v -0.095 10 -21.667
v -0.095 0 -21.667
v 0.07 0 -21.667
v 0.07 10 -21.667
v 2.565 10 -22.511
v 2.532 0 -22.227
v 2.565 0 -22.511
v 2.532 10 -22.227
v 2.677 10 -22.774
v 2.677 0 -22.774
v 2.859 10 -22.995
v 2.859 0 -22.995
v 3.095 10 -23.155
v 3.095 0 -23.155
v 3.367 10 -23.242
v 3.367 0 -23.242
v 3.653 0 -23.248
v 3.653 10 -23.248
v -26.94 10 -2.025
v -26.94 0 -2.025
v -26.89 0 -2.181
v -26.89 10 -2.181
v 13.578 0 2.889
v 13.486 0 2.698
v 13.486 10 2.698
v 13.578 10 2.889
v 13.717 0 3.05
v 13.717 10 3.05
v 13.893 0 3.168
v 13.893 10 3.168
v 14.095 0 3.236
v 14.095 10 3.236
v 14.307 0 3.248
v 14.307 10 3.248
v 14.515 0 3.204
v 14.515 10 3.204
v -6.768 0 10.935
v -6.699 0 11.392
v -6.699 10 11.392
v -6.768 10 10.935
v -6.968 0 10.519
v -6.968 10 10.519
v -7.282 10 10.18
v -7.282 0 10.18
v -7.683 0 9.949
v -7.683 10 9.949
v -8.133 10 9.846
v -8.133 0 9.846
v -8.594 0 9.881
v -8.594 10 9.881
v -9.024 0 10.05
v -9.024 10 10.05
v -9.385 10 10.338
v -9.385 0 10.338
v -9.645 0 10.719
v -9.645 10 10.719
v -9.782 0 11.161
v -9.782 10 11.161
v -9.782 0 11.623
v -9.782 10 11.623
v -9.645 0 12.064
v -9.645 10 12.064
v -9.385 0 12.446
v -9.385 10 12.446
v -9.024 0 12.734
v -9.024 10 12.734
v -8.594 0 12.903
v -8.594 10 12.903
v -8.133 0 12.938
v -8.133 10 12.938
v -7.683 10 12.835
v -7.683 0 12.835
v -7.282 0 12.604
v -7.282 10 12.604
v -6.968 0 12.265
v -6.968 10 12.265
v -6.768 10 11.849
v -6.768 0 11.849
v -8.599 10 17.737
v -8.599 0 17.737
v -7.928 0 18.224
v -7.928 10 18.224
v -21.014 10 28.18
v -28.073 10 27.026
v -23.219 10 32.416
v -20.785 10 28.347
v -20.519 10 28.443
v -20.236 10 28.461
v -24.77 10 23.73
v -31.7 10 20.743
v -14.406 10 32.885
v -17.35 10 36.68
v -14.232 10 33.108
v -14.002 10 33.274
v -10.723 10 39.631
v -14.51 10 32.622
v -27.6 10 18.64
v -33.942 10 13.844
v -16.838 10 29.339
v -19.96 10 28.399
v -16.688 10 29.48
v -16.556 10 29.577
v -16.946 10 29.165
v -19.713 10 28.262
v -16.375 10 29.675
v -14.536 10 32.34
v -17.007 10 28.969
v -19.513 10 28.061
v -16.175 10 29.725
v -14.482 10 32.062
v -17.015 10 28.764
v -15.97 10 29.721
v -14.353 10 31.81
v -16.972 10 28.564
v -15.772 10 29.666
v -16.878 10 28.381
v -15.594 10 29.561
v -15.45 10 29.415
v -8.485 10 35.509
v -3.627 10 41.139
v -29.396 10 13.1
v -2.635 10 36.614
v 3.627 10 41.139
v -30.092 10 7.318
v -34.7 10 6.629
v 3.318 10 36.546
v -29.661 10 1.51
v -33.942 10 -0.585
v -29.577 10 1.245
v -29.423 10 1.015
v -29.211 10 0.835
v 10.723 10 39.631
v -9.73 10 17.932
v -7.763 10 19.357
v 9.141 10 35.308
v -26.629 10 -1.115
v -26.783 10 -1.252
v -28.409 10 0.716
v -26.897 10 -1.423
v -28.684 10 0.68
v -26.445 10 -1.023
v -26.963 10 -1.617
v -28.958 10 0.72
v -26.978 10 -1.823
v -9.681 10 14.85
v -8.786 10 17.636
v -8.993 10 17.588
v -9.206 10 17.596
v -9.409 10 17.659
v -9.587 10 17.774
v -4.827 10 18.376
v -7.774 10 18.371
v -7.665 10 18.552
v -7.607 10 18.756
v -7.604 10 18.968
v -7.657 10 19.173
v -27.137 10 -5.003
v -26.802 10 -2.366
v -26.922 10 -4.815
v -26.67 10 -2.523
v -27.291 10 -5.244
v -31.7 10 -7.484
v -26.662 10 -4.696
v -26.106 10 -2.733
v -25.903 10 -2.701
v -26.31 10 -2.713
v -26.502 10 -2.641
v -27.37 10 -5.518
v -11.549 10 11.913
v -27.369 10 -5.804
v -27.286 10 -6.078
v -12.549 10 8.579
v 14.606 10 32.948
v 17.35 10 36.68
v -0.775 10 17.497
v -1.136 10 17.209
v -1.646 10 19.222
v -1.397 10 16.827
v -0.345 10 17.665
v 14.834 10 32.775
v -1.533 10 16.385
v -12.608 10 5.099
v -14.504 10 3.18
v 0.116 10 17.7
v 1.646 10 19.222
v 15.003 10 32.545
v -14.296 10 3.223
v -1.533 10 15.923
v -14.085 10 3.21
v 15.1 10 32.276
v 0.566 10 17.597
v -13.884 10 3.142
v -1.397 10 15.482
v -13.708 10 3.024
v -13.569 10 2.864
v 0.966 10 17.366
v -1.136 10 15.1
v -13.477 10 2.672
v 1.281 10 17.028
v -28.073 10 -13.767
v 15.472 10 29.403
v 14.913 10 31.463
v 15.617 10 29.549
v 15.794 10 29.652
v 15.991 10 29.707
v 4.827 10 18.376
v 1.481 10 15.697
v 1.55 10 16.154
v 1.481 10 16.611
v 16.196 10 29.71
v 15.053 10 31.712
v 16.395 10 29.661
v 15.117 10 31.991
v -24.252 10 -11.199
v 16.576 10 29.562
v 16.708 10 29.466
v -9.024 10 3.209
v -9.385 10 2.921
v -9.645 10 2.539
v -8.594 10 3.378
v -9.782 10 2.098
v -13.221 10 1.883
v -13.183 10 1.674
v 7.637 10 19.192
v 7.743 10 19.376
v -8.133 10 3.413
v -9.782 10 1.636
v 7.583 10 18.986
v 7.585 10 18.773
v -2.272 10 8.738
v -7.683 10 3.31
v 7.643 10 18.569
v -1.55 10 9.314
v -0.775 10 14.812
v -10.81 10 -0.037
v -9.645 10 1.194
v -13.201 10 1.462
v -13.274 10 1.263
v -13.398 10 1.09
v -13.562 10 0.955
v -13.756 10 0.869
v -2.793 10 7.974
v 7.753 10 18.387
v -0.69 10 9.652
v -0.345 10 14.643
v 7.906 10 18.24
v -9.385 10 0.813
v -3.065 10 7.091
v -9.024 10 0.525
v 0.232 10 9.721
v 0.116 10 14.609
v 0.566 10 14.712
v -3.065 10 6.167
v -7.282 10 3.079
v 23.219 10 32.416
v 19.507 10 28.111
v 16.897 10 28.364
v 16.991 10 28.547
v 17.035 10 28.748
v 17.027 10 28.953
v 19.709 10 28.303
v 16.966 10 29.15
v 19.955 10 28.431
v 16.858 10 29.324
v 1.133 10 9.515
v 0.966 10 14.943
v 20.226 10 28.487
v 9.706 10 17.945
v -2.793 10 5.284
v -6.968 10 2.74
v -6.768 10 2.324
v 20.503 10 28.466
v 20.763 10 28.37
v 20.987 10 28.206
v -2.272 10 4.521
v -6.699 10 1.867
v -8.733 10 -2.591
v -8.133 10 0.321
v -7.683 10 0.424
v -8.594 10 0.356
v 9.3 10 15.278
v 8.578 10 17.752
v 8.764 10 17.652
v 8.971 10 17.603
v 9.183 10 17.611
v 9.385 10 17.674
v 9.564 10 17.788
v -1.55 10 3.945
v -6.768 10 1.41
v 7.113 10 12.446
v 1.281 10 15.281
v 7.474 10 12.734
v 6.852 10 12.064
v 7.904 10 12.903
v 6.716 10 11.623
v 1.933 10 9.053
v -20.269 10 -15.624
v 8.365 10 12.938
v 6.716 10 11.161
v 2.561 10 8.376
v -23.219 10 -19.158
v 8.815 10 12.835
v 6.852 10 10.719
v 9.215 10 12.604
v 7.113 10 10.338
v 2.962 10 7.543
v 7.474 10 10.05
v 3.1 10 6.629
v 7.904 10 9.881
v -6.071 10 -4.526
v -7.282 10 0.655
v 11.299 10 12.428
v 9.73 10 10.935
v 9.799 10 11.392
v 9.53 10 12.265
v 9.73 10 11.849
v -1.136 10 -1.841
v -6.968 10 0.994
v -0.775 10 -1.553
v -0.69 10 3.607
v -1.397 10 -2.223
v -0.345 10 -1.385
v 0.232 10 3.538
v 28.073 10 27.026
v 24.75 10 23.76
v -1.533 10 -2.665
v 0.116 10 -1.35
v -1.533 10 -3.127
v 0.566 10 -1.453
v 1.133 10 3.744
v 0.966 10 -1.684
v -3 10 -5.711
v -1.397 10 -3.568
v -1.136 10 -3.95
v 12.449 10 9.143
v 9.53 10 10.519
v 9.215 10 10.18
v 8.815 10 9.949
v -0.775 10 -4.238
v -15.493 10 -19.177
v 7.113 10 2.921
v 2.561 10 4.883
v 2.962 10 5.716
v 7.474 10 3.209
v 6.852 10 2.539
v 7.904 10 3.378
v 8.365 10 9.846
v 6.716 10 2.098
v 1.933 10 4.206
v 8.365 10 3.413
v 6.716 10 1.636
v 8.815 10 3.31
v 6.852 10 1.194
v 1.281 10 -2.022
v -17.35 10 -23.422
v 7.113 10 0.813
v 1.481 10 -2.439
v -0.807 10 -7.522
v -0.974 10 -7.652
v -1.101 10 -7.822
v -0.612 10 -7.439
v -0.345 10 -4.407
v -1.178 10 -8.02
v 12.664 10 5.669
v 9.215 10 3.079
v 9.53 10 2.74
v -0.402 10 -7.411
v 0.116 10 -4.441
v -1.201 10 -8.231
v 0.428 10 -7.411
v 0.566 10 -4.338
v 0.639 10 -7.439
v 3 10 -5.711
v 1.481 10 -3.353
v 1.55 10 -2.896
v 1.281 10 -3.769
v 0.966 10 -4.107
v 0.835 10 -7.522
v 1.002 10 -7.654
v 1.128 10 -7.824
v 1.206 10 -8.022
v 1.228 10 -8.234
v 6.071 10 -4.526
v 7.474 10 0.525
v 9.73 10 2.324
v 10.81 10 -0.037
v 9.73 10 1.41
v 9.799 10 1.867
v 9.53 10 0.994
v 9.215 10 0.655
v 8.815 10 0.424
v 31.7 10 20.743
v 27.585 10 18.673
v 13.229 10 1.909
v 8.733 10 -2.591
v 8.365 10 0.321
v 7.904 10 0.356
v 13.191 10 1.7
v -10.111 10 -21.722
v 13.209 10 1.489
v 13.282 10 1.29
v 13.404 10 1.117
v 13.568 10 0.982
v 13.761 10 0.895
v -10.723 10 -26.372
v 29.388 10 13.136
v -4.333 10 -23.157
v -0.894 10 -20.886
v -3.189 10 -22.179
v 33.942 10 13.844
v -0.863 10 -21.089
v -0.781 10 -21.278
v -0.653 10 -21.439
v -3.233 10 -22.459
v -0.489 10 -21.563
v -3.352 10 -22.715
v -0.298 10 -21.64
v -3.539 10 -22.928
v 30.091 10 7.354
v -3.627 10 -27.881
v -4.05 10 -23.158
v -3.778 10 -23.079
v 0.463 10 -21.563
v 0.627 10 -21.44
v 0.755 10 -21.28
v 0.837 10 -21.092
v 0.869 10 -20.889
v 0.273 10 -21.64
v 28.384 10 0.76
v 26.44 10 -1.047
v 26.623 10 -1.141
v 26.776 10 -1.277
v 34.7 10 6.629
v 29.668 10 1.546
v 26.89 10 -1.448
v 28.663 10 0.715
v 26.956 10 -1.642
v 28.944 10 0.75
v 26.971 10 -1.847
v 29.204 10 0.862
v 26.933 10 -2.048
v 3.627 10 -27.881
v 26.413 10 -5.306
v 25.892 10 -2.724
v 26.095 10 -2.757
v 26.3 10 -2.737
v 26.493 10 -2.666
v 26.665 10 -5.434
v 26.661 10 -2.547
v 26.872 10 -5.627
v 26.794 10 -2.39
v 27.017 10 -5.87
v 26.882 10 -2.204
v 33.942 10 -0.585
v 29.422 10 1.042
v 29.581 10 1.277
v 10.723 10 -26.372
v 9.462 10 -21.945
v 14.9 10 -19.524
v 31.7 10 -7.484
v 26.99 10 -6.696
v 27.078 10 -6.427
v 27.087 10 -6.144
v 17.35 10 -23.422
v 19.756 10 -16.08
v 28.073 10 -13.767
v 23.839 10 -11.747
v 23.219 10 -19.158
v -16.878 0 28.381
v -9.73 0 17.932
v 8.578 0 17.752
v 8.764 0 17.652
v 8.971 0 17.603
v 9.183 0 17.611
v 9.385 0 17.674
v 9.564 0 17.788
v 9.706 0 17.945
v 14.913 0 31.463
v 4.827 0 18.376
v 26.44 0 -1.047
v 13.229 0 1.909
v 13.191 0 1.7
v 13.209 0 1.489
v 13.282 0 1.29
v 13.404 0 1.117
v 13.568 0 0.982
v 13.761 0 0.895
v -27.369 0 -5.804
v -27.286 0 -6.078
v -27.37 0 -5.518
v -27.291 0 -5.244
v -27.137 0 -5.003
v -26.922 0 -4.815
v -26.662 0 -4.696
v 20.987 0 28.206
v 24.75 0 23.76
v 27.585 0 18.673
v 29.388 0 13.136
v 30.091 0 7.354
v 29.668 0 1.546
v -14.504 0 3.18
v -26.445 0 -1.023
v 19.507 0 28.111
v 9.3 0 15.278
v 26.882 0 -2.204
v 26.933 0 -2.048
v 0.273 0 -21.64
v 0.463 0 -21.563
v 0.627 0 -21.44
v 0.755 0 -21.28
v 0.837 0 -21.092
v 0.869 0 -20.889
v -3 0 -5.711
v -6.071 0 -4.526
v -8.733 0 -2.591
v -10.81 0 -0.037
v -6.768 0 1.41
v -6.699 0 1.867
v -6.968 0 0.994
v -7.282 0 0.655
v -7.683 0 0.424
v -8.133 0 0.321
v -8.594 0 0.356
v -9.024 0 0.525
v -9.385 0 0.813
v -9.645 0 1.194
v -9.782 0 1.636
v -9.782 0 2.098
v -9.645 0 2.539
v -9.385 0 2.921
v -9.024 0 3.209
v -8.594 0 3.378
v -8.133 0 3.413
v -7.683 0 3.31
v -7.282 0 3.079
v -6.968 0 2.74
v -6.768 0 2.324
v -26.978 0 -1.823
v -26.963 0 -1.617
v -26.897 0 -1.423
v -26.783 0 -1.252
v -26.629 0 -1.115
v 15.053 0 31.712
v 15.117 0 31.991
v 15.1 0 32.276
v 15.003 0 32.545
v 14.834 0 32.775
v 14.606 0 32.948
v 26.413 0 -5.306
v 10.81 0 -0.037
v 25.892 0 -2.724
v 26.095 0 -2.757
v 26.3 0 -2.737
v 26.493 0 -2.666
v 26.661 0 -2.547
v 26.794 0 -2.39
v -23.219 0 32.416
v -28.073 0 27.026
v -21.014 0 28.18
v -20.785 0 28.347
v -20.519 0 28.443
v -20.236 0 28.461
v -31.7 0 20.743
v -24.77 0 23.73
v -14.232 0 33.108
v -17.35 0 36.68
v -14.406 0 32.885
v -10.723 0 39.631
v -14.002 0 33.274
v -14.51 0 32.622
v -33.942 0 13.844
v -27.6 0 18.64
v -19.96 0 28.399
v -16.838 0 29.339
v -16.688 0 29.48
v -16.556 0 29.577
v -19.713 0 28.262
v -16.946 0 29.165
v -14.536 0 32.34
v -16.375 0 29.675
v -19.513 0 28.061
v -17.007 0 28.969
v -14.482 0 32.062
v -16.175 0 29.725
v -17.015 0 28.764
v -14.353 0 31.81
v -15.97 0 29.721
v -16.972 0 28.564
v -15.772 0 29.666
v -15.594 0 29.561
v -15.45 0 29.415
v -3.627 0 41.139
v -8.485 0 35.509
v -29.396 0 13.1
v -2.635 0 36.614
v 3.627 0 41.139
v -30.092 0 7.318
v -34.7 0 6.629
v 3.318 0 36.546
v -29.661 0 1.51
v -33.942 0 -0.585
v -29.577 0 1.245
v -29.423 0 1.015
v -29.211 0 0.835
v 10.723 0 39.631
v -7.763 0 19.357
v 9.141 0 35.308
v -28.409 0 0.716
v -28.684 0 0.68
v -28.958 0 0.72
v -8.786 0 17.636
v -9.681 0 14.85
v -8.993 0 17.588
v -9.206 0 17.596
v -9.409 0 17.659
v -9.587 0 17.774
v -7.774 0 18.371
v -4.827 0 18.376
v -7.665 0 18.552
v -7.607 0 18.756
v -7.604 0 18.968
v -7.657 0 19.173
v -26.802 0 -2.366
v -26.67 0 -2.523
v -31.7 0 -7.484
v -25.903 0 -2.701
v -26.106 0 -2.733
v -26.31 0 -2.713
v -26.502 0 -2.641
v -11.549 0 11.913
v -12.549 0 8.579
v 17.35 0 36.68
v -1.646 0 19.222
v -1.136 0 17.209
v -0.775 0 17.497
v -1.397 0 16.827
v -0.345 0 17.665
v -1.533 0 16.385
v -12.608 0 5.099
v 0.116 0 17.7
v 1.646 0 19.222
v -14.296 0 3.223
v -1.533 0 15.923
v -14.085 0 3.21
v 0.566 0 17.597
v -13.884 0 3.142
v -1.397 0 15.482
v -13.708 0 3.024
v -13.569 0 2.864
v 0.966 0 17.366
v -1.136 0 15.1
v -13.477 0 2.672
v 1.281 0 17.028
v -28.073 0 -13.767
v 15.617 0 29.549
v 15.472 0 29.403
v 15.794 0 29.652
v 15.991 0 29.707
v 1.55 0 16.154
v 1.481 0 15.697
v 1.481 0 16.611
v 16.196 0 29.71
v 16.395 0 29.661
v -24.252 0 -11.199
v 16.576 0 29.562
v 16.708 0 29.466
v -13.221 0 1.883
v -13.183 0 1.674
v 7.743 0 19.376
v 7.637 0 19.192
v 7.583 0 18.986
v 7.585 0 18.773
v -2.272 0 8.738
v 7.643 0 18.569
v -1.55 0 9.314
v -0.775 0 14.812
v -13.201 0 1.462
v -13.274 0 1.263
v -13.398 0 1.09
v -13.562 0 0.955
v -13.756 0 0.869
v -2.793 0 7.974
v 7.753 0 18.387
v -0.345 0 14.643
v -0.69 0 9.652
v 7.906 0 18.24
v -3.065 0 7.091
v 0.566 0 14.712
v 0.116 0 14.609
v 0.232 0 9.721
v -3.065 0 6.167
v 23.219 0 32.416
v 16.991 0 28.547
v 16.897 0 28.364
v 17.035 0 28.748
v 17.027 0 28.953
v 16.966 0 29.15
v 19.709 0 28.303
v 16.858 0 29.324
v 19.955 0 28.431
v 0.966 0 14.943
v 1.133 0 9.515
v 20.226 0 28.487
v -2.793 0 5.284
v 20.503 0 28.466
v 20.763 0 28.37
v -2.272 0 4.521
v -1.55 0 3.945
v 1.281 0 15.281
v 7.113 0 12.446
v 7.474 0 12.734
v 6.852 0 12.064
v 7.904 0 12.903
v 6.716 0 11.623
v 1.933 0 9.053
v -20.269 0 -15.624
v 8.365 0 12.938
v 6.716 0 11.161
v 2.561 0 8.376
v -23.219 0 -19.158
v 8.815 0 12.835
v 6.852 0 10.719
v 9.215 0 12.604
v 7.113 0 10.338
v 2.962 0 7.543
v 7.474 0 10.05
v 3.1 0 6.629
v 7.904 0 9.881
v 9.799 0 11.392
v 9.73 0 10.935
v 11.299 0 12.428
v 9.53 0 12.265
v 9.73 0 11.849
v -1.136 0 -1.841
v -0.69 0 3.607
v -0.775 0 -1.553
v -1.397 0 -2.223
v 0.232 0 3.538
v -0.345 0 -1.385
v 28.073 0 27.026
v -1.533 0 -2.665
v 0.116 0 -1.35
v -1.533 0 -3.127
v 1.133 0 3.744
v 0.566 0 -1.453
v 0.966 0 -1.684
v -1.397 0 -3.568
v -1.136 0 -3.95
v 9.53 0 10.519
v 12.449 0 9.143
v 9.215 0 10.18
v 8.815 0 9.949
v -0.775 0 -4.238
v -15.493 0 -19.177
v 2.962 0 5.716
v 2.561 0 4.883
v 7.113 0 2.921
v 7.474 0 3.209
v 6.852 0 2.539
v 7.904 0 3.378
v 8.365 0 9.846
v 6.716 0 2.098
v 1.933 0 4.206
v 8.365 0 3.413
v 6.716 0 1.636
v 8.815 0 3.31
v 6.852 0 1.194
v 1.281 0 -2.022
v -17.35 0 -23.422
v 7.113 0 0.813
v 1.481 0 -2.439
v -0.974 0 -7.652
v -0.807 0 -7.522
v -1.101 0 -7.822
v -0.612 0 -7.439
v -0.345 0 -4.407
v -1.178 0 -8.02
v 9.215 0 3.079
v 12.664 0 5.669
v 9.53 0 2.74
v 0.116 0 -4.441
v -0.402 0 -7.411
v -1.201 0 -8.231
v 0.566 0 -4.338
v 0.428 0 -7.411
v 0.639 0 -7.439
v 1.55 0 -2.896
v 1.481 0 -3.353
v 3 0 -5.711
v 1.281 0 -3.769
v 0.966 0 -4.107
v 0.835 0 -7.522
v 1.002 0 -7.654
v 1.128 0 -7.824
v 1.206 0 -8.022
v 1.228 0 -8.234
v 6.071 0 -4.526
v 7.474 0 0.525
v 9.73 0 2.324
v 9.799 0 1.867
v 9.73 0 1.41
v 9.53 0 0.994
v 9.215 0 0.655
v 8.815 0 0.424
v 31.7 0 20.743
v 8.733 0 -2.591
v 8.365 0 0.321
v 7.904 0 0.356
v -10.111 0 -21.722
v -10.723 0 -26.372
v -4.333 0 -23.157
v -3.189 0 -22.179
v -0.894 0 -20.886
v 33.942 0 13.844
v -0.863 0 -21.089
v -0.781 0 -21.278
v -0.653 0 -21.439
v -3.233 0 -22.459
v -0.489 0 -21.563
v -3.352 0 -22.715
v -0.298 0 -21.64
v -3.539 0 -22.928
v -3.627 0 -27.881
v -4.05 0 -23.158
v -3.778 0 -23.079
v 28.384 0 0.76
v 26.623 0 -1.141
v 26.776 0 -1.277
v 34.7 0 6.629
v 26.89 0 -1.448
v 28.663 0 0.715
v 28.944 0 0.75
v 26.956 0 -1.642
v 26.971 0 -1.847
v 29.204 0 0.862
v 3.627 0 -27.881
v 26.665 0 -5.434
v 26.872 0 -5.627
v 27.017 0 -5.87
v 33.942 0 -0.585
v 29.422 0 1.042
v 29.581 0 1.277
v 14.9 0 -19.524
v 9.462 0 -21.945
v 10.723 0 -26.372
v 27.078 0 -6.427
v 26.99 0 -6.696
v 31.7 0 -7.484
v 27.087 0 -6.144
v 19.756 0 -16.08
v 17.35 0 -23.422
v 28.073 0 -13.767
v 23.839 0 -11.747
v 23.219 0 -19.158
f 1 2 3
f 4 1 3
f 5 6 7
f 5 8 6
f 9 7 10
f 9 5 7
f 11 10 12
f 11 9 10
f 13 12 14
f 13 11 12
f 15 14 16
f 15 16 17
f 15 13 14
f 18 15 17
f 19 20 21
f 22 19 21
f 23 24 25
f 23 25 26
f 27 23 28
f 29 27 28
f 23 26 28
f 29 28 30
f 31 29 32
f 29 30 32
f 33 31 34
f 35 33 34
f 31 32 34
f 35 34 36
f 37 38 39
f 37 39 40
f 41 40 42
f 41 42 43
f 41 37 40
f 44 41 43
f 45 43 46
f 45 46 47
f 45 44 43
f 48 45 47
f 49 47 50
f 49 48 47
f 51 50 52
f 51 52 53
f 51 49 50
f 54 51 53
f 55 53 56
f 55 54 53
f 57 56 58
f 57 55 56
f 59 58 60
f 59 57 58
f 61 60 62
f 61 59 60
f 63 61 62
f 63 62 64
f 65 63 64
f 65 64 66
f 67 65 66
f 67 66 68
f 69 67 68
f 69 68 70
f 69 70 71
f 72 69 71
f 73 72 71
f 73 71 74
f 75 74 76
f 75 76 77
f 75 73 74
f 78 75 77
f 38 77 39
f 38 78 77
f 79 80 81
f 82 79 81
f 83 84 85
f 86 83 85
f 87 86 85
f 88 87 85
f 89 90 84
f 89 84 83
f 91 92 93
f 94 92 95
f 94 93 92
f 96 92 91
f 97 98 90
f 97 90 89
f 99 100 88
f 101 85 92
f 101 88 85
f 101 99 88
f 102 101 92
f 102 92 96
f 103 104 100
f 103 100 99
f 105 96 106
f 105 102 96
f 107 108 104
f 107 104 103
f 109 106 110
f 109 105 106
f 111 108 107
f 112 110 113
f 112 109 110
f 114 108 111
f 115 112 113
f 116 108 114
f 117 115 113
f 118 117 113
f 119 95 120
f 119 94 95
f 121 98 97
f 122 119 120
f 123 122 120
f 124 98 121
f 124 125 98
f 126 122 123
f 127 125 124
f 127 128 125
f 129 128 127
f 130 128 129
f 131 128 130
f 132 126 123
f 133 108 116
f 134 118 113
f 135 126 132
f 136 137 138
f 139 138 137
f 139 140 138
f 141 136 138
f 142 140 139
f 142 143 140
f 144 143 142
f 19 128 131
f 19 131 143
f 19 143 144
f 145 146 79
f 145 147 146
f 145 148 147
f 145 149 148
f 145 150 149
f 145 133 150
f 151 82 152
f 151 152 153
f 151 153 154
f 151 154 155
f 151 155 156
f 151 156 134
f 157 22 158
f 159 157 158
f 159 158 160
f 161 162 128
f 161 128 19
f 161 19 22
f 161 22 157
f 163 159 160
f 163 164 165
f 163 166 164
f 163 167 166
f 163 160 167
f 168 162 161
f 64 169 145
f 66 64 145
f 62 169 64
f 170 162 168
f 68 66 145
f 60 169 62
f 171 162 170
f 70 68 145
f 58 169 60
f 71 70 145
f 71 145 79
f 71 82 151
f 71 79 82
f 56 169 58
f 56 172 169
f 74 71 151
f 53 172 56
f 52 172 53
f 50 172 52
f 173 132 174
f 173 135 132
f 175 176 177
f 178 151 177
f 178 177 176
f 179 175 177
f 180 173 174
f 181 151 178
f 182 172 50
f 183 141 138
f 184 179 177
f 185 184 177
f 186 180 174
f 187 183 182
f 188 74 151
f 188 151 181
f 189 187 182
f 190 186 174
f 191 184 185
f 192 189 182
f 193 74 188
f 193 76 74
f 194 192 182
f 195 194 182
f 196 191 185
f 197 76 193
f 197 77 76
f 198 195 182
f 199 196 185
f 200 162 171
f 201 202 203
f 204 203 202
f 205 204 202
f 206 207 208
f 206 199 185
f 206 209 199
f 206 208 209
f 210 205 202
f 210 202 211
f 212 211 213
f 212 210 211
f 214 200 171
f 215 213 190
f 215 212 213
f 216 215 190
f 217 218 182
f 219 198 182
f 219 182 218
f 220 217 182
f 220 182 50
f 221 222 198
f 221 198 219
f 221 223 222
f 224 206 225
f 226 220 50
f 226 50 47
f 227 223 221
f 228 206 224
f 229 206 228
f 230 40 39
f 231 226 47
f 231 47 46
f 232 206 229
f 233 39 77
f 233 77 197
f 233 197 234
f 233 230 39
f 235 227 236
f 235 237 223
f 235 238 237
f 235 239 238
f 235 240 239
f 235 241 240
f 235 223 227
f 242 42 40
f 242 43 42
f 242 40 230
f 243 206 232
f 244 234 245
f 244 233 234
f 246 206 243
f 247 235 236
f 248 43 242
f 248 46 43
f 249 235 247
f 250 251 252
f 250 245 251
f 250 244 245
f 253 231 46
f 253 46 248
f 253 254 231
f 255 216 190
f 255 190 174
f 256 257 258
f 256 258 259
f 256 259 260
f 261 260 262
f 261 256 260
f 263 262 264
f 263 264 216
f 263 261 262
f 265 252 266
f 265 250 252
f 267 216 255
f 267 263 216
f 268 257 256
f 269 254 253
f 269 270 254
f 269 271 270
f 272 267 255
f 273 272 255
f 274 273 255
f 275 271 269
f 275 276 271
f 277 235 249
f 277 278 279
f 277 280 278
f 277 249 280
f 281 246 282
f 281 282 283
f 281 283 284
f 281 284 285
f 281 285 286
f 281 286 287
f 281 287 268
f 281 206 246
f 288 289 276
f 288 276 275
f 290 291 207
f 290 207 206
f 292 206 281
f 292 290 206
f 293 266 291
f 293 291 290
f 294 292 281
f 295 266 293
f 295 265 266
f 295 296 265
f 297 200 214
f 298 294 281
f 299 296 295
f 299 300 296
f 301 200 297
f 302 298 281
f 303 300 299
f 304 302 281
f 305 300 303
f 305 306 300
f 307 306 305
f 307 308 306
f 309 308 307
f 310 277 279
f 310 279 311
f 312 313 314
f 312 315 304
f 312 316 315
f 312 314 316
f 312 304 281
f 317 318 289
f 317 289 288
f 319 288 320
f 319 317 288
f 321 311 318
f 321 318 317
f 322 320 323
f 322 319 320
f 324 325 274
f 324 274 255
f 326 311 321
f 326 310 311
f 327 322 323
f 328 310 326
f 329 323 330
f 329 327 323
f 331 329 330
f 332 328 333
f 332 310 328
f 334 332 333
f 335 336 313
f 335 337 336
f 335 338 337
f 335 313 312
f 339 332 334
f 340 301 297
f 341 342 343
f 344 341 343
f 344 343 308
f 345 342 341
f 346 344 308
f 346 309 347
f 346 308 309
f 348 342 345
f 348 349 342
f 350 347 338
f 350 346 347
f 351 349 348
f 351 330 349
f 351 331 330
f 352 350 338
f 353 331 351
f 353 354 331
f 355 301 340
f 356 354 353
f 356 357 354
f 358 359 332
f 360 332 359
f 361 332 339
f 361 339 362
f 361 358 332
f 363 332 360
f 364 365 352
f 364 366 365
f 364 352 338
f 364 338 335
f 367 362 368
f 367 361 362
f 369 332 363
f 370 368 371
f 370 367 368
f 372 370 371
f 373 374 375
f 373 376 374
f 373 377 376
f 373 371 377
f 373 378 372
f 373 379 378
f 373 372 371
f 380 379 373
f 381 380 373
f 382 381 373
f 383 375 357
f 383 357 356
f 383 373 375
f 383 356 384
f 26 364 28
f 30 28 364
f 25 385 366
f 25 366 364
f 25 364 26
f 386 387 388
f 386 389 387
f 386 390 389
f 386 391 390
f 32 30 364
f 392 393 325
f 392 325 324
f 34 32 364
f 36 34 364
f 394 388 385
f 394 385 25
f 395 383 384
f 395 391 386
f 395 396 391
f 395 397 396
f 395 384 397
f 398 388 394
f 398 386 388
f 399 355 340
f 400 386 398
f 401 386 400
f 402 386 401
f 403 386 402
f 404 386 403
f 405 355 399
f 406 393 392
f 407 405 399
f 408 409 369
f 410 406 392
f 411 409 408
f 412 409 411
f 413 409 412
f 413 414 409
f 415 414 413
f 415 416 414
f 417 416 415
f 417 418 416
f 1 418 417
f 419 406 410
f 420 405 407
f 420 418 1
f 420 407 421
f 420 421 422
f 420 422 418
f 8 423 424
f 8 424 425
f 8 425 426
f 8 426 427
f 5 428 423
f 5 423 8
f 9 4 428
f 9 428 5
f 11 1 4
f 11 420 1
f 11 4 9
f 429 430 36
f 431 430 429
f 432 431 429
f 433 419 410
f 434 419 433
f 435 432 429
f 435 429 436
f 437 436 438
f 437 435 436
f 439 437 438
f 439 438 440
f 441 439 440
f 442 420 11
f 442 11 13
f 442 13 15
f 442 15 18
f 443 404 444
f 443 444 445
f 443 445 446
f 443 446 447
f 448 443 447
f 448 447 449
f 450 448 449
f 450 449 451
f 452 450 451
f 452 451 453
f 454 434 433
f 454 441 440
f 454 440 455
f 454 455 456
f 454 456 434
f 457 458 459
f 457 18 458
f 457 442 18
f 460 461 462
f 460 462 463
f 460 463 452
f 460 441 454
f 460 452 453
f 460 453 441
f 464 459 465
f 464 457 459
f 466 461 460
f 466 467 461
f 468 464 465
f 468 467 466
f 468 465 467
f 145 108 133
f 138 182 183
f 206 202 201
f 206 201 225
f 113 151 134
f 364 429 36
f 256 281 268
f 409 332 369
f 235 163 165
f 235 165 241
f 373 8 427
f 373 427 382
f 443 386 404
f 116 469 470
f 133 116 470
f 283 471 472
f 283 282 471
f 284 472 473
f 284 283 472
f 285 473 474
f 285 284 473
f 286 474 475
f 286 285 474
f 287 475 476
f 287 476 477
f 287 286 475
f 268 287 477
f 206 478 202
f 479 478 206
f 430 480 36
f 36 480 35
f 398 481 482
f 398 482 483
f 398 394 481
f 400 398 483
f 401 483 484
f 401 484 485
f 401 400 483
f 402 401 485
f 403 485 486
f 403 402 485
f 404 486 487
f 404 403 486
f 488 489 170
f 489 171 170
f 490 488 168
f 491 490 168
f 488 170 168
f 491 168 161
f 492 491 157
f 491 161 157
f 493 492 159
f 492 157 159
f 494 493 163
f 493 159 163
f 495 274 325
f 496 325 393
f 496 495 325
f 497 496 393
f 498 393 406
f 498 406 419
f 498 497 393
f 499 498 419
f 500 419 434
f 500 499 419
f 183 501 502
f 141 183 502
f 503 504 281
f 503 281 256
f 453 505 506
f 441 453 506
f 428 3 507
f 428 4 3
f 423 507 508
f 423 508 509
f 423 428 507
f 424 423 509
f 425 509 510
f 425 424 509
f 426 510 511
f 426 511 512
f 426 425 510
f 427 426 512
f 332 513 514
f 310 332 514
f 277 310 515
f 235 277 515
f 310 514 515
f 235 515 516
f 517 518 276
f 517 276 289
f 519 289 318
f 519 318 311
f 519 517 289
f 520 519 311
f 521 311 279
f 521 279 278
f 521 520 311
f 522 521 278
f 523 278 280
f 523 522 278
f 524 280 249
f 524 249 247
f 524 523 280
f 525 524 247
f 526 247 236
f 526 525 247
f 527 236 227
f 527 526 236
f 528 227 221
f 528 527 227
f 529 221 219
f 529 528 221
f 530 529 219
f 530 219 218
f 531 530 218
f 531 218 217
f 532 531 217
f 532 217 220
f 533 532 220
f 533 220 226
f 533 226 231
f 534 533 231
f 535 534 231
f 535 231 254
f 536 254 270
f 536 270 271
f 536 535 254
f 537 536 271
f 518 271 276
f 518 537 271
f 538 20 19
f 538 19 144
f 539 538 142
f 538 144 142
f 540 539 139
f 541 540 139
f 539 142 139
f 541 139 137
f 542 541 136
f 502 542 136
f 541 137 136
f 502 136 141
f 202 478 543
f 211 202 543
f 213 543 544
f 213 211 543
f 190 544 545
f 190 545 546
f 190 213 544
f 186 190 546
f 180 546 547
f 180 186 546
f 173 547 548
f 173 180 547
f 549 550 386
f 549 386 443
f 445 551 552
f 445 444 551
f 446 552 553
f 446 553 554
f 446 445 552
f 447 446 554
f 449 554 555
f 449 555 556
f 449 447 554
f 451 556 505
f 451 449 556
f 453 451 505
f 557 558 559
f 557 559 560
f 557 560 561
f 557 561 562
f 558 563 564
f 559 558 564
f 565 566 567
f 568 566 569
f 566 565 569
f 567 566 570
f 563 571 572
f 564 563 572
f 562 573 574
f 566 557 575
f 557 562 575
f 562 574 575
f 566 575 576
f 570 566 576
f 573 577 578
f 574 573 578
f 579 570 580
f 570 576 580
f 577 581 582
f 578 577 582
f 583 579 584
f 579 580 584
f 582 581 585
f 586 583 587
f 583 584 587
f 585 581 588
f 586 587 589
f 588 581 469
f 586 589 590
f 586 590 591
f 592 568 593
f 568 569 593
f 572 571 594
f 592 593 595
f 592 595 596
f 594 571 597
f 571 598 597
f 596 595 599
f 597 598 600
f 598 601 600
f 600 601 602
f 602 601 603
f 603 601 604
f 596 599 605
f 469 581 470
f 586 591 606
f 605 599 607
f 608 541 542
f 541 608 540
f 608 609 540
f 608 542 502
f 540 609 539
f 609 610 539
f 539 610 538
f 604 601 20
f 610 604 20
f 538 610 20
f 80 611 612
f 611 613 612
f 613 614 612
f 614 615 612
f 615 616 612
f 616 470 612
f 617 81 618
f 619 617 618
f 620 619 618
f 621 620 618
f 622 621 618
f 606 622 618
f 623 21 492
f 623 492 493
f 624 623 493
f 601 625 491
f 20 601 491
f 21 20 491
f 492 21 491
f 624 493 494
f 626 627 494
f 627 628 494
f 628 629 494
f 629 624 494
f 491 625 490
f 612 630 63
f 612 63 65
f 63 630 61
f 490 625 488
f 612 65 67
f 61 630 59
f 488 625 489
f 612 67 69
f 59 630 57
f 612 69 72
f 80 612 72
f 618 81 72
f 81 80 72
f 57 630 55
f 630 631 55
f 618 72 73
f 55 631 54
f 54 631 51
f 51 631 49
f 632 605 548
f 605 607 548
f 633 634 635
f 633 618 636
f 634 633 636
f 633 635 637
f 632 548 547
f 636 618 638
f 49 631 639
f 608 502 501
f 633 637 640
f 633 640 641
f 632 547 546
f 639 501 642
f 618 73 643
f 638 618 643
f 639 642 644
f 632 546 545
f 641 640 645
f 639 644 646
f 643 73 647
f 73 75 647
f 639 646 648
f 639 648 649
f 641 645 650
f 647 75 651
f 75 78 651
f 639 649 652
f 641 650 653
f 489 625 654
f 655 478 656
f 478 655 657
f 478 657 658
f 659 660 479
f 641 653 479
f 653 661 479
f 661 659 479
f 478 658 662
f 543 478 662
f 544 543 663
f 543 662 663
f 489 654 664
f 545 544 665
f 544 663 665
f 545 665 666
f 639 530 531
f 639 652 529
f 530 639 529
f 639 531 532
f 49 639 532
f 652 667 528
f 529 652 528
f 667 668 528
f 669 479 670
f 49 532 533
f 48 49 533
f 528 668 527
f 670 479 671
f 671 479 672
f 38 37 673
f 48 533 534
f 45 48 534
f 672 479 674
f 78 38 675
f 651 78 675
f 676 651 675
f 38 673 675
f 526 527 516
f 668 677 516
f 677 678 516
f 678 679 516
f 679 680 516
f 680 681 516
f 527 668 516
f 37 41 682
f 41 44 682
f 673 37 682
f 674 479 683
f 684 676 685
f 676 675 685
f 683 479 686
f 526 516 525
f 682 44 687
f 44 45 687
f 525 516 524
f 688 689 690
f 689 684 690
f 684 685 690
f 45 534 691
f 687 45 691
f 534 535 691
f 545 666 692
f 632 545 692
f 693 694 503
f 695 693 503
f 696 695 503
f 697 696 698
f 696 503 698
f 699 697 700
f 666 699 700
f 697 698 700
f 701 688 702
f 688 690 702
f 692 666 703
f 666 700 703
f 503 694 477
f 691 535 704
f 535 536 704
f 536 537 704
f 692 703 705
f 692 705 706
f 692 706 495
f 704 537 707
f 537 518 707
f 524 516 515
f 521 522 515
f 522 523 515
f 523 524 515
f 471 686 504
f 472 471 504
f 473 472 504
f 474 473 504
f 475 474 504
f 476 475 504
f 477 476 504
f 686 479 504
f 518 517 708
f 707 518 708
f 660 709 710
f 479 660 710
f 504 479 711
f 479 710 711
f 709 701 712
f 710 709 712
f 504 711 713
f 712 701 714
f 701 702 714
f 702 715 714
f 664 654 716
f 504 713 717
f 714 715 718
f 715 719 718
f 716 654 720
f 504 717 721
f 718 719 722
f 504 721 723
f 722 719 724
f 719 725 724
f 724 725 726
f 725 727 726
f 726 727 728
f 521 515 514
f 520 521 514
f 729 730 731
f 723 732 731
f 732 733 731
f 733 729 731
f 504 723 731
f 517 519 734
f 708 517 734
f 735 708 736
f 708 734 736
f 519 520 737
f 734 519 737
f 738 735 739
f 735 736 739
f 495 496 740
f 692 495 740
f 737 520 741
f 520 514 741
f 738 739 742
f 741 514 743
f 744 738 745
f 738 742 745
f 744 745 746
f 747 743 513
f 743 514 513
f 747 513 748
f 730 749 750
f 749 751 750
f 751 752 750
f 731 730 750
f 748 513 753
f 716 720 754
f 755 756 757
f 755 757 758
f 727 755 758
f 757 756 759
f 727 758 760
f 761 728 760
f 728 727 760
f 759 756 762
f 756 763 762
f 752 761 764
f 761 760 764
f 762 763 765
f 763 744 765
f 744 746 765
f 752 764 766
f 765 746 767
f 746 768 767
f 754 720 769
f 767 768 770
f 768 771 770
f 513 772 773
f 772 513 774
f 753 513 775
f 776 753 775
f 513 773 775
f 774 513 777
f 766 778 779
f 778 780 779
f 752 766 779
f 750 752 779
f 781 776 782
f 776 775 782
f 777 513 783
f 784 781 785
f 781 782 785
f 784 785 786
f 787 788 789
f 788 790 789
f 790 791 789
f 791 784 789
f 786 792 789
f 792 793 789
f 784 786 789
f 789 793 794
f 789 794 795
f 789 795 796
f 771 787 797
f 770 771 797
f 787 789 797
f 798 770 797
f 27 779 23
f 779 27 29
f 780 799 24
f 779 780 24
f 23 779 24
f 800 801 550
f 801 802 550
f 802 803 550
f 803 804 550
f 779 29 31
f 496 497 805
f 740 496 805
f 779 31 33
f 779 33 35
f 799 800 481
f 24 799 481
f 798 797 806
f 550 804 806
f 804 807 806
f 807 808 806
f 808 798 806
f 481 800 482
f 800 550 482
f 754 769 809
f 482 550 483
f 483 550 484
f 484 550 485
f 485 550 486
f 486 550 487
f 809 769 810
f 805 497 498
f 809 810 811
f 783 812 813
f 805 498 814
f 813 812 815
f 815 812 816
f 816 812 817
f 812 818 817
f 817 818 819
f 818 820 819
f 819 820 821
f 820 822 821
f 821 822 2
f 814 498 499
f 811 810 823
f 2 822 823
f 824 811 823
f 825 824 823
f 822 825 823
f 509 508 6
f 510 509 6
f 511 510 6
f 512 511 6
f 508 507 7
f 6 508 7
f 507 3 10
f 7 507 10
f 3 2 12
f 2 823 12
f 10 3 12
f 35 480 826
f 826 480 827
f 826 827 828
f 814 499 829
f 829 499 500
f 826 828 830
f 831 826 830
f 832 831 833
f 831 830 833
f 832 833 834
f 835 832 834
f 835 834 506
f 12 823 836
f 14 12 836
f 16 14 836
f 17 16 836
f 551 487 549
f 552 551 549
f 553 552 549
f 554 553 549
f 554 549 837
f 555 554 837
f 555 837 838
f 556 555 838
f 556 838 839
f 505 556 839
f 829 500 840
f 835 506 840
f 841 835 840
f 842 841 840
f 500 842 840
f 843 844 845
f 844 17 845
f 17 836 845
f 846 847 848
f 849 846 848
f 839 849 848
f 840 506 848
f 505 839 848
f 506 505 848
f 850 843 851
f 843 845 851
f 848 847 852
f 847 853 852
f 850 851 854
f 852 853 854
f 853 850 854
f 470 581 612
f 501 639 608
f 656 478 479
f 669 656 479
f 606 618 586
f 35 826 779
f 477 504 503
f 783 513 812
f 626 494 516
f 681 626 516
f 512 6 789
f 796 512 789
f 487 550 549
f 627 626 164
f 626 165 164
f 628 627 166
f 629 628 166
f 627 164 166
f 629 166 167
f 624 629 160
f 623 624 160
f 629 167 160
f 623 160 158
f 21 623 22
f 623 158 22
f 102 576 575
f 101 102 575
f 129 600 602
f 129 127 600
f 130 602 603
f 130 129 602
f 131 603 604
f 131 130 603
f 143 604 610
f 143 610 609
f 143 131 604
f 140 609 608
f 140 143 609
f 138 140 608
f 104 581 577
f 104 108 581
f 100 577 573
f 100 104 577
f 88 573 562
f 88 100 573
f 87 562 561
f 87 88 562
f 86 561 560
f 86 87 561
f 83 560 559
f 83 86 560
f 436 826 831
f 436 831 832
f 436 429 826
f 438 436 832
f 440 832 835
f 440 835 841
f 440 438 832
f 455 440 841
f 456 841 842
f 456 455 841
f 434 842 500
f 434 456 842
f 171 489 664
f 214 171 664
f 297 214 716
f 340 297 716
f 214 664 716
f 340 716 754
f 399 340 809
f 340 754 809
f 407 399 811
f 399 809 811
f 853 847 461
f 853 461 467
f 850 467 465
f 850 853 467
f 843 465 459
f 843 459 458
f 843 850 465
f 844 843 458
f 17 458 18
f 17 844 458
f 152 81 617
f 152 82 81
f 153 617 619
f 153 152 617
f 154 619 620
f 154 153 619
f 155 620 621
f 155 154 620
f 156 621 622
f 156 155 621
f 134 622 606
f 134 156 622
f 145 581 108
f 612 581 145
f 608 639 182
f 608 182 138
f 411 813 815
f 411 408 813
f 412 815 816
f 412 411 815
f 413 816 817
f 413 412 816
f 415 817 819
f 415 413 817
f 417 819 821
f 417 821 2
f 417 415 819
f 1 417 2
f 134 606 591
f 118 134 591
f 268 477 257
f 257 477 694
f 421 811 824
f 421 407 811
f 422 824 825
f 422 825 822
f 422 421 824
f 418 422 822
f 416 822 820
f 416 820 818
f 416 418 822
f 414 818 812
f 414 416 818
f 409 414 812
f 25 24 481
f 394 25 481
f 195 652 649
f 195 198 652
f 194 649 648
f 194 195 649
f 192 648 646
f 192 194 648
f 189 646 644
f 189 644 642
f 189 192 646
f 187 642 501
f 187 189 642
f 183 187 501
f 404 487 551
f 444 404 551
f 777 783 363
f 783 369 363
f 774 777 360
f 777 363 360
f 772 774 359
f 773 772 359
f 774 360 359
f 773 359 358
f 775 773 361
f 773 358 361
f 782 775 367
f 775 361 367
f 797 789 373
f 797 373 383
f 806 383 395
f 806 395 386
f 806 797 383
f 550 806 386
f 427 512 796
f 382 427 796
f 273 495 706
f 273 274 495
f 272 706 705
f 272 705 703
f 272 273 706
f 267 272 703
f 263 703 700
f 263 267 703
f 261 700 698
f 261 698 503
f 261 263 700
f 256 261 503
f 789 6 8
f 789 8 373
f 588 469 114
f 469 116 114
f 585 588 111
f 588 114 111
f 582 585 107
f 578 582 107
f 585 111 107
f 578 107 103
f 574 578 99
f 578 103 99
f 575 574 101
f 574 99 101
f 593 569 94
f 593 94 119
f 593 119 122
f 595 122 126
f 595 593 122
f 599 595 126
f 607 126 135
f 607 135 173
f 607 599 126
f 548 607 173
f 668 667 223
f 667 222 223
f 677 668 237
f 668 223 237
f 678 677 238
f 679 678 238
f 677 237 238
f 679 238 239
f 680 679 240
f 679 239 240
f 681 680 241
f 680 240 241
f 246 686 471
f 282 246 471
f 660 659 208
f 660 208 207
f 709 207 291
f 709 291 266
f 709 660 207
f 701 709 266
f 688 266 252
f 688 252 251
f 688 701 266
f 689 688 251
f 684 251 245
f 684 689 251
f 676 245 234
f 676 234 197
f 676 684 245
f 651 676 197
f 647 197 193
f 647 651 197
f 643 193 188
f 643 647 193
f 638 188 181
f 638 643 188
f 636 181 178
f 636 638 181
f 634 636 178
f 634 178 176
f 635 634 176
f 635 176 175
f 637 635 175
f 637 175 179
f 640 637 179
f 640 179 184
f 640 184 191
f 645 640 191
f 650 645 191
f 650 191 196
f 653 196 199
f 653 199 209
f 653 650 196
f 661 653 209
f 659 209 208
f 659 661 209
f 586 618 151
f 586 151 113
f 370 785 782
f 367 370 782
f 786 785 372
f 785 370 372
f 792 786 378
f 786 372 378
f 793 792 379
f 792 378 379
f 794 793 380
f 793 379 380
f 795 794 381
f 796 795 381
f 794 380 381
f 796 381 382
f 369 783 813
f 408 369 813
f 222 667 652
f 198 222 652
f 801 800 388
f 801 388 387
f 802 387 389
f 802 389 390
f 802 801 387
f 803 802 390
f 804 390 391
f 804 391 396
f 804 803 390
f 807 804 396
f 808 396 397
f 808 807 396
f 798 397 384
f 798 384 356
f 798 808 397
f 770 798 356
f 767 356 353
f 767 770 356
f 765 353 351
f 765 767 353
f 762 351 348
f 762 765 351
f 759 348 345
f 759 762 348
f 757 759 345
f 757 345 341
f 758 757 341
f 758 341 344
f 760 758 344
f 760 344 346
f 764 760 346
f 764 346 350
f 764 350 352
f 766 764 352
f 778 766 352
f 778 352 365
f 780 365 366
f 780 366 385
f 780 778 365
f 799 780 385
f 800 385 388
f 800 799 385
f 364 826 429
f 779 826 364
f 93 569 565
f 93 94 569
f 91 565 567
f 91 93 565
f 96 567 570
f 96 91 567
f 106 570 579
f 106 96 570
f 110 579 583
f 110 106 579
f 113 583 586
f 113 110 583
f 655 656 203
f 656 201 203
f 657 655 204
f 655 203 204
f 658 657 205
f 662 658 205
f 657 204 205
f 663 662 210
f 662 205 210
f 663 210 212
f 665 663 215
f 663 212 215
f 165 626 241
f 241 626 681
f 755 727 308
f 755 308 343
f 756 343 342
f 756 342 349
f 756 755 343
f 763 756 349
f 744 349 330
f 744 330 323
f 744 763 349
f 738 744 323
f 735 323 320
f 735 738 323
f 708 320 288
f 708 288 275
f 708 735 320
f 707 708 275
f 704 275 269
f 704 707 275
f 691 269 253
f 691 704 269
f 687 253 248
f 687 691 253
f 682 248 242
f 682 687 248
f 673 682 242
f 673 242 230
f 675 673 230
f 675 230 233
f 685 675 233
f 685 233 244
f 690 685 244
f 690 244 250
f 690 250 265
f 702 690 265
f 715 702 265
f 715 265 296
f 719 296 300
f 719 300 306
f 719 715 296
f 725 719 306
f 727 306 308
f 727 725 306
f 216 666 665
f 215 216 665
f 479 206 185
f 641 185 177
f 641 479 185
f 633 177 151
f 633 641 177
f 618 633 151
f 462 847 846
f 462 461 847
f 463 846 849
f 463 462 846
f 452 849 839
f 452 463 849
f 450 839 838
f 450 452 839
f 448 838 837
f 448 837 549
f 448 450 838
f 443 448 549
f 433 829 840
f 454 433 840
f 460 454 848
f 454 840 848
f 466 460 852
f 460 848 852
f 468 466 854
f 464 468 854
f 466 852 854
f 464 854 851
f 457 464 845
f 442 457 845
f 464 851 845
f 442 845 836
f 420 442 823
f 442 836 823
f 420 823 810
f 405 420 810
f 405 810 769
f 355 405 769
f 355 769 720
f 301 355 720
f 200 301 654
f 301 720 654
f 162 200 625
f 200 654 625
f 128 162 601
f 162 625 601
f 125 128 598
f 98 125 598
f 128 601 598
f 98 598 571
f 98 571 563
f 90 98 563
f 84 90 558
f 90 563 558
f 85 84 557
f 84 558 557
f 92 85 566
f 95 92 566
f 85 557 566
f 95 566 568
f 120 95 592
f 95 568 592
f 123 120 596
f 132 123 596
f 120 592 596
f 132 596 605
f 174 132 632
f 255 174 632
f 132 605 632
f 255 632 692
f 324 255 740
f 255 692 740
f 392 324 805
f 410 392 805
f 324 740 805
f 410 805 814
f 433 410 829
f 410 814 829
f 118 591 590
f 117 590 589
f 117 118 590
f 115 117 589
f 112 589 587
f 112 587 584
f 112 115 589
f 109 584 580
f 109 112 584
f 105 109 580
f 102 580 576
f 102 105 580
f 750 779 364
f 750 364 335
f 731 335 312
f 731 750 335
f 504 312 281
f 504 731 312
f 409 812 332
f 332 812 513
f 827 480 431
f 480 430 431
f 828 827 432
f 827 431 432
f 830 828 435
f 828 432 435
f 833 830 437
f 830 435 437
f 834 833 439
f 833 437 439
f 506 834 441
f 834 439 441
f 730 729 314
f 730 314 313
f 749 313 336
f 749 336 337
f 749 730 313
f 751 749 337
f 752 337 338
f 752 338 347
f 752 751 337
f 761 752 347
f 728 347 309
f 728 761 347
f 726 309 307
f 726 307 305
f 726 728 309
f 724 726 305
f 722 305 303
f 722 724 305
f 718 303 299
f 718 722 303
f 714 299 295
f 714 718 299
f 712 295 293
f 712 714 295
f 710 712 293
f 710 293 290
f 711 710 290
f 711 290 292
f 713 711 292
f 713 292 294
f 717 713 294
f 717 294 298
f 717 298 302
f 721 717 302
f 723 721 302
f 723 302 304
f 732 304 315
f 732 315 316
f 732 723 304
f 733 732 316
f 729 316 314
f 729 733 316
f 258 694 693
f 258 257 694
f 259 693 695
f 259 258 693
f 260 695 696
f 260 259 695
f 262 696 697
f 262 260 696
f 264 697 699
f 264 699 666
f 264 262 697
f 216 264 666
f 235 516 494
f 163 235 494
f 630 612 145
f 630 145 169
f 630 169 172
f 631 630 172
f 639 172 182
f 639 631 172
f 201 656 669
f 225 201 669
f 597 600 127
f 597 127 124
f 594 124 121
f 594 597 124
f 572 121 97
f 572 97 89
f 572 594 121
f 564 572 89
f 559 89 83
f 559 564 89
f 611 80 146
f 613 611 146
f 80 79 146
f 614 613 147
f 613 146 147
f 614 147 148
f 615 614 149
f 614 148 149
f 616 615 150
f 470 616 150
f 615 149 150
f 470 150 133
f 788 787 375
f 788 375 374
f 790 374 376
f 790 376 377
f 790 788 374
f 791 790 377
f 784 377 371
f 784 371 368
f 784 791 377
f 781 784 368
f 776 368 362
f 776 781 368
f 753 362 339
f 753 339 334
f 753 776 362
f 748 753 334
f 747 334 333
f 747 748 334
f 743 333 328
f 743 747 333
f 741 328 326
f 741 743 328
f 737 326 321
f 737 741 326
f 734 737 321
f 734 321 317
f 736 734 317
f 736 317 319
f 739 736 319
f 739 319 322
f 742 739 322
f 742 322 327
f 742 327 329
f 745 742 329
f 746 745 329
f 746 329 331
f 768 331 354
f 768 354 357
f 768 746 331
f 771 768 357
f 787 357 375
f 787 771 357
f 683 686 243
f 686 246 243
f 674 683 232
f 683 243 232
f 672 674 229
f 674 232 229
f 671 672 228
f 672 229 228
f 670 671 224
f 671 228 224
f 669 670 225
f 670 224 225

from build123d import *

# Parameters (mm, degrees)
SKETCH1_R           = 34.7
SKETCH1_R_2         = 1.55
SKETCH1_R_3         = 3.1
BOSS_EXTRUDE1_DEPTH = 10
FILLET2_R           = 1
FILLET3_R           = 0.8


with BuildPart() as part:
    # Sketch1 → Boss-Extrude1 (new body)
    with BuildSketch(Plane(origin=(0, 0, 0), x_dir=(1, 0, 0), z_dir=(0, 1, 0))):
        with Locations((0, -6.629356842)):
            Circle(SKETCH1_R)
        with Locations((0, 2.895643158)):
            Circle(SKETCH1_R_2, mode=Mode.SUBTRACT)
        with Locations((-8.248891971, -1.866856842)):
            Circle(SKETCH1_R_2, mode=Mode.SUBTRACT)
        with Locations((-8.248891971, -11.391856842)):
            Circle(SKETCH1_R_2, mode=Mode.SUBTRACT)
        with Locations((0, -16.154356842)):
            Circle(SKETCH1_R_2, mode=Mode.SUBTRACT)
        with Locations((8.248891971, -1.866856842)):
            Circle(SKETCH1_R_2, mode=Mode.SUBTRACT)
        with Locations((0, -6.629356842)):
            Circle(SKETCH1_R_3, mode=Mode.SUBTRACT)
        with Locations((8.248891971, -11.391856842)):
            Circle(SKETCH1_R_2, mode=Mode.SUBTRACT)
        with BuildLine():
            Line((-3.20212766, 23.299832563), (-3, 5.711226612))
            ThreePointArc((-3, 5.711226612), (-7.464872704, 3.645158986), (-10.809541326, 0.037262715))
            Line((-10.809541326, 0.037262715), (-27.755348523, 5.017558129))
            ThreePointArc((-27.755348523, 5.017558129), (-17.976421293, 17.513101141), (-3.20212766, 23.299832563))
        make_face(mode=Mode.SUBTRACT)
        with BuildLine():
            Line((2.5, 23.366642891), (3, 5.711226612))
            ThreePointArc((3, 5.711226612), (7.464872704, 3.645158986), (10.809541326, 0.037262715))
            Line((10.809541326, 0.037262715), (27.474838746, 5.664675689))
            ThreePointArc((27.474838746, 5.664675689), (17.405822307, 17.927665571), (2.5, 23.366642891))
        make_face(mode=Mode.SUBTRACT)
        Polygon((-0.875343089, 21.666642891), (0.847462288, 21.666642891), (1.251174555, 7.411226612), (-1.221162893, 7.411226612), align=None, mode=Mode.SUBTRACT)
        Polygon((12.9760283, -1.129183017), (26.640599041, 2.947088697), (27.17297518, 1.308603417), (13.740022588, -3.480515657), align=None, mode=Mode.SUBTRACT)
        with BuildLine():
            Line((29.453862476, -0.426133065), (12.663643293, -5.669076383))
            ThreePointArc((12.663643293, -5.669076383), (11.986909153, -10.825070007), (9.300423223, -15.27760105))
            Line((9.300423223, -15.27760105), (20.18251184, -28.960416285))
            ThreePointArc((20.18251184, -28.960416285), (28.62680114, -15.930768373), (29.453862476, -0.426133065))
        make_face(mode=Mode.SUBTRACT)
        Polygon((9.240789422, -17.270645929), (17.340138777, -29.006787741), (15.946359949, -30.019427334), (7.24062641, -18.723849419), align=None, mode=Mode.SUBTRACT)
        with BuildLine():
            Line((15.608663785, -32.36609352), (4.826561976, -18.376454334))
            ThreePointArc((4.826561976, -18.376454334), (0, -19.329356842), (-4.826561976, -18.376454334))
            Line((-4.826561976, -18.376454334), (-15.001360451, -32.724743113))
            ThreePointArc((-15.001360451, -32.724743113), (0.352649568, -36.727290962), (15.608663785, -32.36609352))
        make_face(mode=Mode.SUBTRACT)
        Polygon((-7.264906355, -18.706209007), (-15.923803908, -30.035815257), (-17.317582735, -29.023175665), (-9.265069366, -17.253005516), align=None, mode=Mode.SUBTRACT)
        with BuildLine():
            Line((-20.18251184, -28.960416285), (-9.680663942, -14.849742821))
            ThreePointArc((-9.680663942, -14.849742821), (-12.163791536, -10.280682009), (-12.607510846, -5.099431917))
            Line((-12.607510846, -5.099431917), (-29.453862476, -0.426133065))
            ThreePointArc((-29.453862476, -0.426133065), (-28.62680114, -15.930768373), (-20.18251184, -28.960416285))
        make_face(mode=Mode.SUBTRACT)
        Polygon((-13.730748474, -3.451972871), (-27.181590822, 1.2820872), (-26.649214682, 2.920572479), (-12.966754187, -1.10064023), align=None, mode=Mode.SUBTRACT)
    extrude(amount=BOSS_EXTRUDE1_DEPTH)

    # Fillet2
    fillet2_edges = [part.edges().sort_by_distance(p)[0] for p in [
        (15.608663785, 5, 32.36609352),
        (-29.453862476, 5, 0.426133065),
        (-20.18251184, 5, 28.960416285),
        (27.474838746, 5, -5.664675689),
        (2.5, 5, -23.366642891),
        (-3.20212766, 5, -23.299832563),
        (-27.755348523, 5, -5.017558129),
        (20.18251184, 5, 28.960416285),
        (29.453862476, 5, 0.426133065),
        (-15.001360451, 5, 32.724743113),
    ]]
    fillet(fillet2_edges, radius=FILLET2_R)

    # Fillet3
    fillet3_edges = [part.edges().sort_by_distance(p)[0] for p in [
        (15.946359949, 5, 30.019427334),
        (17.340138777, 5, 29.006787741),
        (9.240789422, 5, 17.270645929),
        (7.24062641, 5, 18.723849419),
        (-17.317582735, 5, 29.023175665),
        (-15.923803908, 5, 30.035815257),
        (-7.264906355, 5, 18.706209007),
        (-9.265069366, 5, 17.253005516),
        (-26.649214682, 5, -2.920572479),
        (-27.181590822, 5, -1.2820872),
        (-13.730748474, 5, 3.451972871),
        (-12.966754187, 5, 1.10064023),
        (-0.875343089, 5, -21.666642891),
        (-1.221162893, 5, -7.411226612),
        (1.251174555, 5, -7.411226612),
        (0.847462288, 5, -21.666642891),
        (27.17297518, 5, -1.308603417),
        (26.640599041, 5, -2.947088697),
        (12.9760283, 5, 1.129183017),
        (13.740022588, 5, 3.480515657),
    ]]
    fillet(fillet3_edges, radius=FILLET3_R)


solid = part.part
